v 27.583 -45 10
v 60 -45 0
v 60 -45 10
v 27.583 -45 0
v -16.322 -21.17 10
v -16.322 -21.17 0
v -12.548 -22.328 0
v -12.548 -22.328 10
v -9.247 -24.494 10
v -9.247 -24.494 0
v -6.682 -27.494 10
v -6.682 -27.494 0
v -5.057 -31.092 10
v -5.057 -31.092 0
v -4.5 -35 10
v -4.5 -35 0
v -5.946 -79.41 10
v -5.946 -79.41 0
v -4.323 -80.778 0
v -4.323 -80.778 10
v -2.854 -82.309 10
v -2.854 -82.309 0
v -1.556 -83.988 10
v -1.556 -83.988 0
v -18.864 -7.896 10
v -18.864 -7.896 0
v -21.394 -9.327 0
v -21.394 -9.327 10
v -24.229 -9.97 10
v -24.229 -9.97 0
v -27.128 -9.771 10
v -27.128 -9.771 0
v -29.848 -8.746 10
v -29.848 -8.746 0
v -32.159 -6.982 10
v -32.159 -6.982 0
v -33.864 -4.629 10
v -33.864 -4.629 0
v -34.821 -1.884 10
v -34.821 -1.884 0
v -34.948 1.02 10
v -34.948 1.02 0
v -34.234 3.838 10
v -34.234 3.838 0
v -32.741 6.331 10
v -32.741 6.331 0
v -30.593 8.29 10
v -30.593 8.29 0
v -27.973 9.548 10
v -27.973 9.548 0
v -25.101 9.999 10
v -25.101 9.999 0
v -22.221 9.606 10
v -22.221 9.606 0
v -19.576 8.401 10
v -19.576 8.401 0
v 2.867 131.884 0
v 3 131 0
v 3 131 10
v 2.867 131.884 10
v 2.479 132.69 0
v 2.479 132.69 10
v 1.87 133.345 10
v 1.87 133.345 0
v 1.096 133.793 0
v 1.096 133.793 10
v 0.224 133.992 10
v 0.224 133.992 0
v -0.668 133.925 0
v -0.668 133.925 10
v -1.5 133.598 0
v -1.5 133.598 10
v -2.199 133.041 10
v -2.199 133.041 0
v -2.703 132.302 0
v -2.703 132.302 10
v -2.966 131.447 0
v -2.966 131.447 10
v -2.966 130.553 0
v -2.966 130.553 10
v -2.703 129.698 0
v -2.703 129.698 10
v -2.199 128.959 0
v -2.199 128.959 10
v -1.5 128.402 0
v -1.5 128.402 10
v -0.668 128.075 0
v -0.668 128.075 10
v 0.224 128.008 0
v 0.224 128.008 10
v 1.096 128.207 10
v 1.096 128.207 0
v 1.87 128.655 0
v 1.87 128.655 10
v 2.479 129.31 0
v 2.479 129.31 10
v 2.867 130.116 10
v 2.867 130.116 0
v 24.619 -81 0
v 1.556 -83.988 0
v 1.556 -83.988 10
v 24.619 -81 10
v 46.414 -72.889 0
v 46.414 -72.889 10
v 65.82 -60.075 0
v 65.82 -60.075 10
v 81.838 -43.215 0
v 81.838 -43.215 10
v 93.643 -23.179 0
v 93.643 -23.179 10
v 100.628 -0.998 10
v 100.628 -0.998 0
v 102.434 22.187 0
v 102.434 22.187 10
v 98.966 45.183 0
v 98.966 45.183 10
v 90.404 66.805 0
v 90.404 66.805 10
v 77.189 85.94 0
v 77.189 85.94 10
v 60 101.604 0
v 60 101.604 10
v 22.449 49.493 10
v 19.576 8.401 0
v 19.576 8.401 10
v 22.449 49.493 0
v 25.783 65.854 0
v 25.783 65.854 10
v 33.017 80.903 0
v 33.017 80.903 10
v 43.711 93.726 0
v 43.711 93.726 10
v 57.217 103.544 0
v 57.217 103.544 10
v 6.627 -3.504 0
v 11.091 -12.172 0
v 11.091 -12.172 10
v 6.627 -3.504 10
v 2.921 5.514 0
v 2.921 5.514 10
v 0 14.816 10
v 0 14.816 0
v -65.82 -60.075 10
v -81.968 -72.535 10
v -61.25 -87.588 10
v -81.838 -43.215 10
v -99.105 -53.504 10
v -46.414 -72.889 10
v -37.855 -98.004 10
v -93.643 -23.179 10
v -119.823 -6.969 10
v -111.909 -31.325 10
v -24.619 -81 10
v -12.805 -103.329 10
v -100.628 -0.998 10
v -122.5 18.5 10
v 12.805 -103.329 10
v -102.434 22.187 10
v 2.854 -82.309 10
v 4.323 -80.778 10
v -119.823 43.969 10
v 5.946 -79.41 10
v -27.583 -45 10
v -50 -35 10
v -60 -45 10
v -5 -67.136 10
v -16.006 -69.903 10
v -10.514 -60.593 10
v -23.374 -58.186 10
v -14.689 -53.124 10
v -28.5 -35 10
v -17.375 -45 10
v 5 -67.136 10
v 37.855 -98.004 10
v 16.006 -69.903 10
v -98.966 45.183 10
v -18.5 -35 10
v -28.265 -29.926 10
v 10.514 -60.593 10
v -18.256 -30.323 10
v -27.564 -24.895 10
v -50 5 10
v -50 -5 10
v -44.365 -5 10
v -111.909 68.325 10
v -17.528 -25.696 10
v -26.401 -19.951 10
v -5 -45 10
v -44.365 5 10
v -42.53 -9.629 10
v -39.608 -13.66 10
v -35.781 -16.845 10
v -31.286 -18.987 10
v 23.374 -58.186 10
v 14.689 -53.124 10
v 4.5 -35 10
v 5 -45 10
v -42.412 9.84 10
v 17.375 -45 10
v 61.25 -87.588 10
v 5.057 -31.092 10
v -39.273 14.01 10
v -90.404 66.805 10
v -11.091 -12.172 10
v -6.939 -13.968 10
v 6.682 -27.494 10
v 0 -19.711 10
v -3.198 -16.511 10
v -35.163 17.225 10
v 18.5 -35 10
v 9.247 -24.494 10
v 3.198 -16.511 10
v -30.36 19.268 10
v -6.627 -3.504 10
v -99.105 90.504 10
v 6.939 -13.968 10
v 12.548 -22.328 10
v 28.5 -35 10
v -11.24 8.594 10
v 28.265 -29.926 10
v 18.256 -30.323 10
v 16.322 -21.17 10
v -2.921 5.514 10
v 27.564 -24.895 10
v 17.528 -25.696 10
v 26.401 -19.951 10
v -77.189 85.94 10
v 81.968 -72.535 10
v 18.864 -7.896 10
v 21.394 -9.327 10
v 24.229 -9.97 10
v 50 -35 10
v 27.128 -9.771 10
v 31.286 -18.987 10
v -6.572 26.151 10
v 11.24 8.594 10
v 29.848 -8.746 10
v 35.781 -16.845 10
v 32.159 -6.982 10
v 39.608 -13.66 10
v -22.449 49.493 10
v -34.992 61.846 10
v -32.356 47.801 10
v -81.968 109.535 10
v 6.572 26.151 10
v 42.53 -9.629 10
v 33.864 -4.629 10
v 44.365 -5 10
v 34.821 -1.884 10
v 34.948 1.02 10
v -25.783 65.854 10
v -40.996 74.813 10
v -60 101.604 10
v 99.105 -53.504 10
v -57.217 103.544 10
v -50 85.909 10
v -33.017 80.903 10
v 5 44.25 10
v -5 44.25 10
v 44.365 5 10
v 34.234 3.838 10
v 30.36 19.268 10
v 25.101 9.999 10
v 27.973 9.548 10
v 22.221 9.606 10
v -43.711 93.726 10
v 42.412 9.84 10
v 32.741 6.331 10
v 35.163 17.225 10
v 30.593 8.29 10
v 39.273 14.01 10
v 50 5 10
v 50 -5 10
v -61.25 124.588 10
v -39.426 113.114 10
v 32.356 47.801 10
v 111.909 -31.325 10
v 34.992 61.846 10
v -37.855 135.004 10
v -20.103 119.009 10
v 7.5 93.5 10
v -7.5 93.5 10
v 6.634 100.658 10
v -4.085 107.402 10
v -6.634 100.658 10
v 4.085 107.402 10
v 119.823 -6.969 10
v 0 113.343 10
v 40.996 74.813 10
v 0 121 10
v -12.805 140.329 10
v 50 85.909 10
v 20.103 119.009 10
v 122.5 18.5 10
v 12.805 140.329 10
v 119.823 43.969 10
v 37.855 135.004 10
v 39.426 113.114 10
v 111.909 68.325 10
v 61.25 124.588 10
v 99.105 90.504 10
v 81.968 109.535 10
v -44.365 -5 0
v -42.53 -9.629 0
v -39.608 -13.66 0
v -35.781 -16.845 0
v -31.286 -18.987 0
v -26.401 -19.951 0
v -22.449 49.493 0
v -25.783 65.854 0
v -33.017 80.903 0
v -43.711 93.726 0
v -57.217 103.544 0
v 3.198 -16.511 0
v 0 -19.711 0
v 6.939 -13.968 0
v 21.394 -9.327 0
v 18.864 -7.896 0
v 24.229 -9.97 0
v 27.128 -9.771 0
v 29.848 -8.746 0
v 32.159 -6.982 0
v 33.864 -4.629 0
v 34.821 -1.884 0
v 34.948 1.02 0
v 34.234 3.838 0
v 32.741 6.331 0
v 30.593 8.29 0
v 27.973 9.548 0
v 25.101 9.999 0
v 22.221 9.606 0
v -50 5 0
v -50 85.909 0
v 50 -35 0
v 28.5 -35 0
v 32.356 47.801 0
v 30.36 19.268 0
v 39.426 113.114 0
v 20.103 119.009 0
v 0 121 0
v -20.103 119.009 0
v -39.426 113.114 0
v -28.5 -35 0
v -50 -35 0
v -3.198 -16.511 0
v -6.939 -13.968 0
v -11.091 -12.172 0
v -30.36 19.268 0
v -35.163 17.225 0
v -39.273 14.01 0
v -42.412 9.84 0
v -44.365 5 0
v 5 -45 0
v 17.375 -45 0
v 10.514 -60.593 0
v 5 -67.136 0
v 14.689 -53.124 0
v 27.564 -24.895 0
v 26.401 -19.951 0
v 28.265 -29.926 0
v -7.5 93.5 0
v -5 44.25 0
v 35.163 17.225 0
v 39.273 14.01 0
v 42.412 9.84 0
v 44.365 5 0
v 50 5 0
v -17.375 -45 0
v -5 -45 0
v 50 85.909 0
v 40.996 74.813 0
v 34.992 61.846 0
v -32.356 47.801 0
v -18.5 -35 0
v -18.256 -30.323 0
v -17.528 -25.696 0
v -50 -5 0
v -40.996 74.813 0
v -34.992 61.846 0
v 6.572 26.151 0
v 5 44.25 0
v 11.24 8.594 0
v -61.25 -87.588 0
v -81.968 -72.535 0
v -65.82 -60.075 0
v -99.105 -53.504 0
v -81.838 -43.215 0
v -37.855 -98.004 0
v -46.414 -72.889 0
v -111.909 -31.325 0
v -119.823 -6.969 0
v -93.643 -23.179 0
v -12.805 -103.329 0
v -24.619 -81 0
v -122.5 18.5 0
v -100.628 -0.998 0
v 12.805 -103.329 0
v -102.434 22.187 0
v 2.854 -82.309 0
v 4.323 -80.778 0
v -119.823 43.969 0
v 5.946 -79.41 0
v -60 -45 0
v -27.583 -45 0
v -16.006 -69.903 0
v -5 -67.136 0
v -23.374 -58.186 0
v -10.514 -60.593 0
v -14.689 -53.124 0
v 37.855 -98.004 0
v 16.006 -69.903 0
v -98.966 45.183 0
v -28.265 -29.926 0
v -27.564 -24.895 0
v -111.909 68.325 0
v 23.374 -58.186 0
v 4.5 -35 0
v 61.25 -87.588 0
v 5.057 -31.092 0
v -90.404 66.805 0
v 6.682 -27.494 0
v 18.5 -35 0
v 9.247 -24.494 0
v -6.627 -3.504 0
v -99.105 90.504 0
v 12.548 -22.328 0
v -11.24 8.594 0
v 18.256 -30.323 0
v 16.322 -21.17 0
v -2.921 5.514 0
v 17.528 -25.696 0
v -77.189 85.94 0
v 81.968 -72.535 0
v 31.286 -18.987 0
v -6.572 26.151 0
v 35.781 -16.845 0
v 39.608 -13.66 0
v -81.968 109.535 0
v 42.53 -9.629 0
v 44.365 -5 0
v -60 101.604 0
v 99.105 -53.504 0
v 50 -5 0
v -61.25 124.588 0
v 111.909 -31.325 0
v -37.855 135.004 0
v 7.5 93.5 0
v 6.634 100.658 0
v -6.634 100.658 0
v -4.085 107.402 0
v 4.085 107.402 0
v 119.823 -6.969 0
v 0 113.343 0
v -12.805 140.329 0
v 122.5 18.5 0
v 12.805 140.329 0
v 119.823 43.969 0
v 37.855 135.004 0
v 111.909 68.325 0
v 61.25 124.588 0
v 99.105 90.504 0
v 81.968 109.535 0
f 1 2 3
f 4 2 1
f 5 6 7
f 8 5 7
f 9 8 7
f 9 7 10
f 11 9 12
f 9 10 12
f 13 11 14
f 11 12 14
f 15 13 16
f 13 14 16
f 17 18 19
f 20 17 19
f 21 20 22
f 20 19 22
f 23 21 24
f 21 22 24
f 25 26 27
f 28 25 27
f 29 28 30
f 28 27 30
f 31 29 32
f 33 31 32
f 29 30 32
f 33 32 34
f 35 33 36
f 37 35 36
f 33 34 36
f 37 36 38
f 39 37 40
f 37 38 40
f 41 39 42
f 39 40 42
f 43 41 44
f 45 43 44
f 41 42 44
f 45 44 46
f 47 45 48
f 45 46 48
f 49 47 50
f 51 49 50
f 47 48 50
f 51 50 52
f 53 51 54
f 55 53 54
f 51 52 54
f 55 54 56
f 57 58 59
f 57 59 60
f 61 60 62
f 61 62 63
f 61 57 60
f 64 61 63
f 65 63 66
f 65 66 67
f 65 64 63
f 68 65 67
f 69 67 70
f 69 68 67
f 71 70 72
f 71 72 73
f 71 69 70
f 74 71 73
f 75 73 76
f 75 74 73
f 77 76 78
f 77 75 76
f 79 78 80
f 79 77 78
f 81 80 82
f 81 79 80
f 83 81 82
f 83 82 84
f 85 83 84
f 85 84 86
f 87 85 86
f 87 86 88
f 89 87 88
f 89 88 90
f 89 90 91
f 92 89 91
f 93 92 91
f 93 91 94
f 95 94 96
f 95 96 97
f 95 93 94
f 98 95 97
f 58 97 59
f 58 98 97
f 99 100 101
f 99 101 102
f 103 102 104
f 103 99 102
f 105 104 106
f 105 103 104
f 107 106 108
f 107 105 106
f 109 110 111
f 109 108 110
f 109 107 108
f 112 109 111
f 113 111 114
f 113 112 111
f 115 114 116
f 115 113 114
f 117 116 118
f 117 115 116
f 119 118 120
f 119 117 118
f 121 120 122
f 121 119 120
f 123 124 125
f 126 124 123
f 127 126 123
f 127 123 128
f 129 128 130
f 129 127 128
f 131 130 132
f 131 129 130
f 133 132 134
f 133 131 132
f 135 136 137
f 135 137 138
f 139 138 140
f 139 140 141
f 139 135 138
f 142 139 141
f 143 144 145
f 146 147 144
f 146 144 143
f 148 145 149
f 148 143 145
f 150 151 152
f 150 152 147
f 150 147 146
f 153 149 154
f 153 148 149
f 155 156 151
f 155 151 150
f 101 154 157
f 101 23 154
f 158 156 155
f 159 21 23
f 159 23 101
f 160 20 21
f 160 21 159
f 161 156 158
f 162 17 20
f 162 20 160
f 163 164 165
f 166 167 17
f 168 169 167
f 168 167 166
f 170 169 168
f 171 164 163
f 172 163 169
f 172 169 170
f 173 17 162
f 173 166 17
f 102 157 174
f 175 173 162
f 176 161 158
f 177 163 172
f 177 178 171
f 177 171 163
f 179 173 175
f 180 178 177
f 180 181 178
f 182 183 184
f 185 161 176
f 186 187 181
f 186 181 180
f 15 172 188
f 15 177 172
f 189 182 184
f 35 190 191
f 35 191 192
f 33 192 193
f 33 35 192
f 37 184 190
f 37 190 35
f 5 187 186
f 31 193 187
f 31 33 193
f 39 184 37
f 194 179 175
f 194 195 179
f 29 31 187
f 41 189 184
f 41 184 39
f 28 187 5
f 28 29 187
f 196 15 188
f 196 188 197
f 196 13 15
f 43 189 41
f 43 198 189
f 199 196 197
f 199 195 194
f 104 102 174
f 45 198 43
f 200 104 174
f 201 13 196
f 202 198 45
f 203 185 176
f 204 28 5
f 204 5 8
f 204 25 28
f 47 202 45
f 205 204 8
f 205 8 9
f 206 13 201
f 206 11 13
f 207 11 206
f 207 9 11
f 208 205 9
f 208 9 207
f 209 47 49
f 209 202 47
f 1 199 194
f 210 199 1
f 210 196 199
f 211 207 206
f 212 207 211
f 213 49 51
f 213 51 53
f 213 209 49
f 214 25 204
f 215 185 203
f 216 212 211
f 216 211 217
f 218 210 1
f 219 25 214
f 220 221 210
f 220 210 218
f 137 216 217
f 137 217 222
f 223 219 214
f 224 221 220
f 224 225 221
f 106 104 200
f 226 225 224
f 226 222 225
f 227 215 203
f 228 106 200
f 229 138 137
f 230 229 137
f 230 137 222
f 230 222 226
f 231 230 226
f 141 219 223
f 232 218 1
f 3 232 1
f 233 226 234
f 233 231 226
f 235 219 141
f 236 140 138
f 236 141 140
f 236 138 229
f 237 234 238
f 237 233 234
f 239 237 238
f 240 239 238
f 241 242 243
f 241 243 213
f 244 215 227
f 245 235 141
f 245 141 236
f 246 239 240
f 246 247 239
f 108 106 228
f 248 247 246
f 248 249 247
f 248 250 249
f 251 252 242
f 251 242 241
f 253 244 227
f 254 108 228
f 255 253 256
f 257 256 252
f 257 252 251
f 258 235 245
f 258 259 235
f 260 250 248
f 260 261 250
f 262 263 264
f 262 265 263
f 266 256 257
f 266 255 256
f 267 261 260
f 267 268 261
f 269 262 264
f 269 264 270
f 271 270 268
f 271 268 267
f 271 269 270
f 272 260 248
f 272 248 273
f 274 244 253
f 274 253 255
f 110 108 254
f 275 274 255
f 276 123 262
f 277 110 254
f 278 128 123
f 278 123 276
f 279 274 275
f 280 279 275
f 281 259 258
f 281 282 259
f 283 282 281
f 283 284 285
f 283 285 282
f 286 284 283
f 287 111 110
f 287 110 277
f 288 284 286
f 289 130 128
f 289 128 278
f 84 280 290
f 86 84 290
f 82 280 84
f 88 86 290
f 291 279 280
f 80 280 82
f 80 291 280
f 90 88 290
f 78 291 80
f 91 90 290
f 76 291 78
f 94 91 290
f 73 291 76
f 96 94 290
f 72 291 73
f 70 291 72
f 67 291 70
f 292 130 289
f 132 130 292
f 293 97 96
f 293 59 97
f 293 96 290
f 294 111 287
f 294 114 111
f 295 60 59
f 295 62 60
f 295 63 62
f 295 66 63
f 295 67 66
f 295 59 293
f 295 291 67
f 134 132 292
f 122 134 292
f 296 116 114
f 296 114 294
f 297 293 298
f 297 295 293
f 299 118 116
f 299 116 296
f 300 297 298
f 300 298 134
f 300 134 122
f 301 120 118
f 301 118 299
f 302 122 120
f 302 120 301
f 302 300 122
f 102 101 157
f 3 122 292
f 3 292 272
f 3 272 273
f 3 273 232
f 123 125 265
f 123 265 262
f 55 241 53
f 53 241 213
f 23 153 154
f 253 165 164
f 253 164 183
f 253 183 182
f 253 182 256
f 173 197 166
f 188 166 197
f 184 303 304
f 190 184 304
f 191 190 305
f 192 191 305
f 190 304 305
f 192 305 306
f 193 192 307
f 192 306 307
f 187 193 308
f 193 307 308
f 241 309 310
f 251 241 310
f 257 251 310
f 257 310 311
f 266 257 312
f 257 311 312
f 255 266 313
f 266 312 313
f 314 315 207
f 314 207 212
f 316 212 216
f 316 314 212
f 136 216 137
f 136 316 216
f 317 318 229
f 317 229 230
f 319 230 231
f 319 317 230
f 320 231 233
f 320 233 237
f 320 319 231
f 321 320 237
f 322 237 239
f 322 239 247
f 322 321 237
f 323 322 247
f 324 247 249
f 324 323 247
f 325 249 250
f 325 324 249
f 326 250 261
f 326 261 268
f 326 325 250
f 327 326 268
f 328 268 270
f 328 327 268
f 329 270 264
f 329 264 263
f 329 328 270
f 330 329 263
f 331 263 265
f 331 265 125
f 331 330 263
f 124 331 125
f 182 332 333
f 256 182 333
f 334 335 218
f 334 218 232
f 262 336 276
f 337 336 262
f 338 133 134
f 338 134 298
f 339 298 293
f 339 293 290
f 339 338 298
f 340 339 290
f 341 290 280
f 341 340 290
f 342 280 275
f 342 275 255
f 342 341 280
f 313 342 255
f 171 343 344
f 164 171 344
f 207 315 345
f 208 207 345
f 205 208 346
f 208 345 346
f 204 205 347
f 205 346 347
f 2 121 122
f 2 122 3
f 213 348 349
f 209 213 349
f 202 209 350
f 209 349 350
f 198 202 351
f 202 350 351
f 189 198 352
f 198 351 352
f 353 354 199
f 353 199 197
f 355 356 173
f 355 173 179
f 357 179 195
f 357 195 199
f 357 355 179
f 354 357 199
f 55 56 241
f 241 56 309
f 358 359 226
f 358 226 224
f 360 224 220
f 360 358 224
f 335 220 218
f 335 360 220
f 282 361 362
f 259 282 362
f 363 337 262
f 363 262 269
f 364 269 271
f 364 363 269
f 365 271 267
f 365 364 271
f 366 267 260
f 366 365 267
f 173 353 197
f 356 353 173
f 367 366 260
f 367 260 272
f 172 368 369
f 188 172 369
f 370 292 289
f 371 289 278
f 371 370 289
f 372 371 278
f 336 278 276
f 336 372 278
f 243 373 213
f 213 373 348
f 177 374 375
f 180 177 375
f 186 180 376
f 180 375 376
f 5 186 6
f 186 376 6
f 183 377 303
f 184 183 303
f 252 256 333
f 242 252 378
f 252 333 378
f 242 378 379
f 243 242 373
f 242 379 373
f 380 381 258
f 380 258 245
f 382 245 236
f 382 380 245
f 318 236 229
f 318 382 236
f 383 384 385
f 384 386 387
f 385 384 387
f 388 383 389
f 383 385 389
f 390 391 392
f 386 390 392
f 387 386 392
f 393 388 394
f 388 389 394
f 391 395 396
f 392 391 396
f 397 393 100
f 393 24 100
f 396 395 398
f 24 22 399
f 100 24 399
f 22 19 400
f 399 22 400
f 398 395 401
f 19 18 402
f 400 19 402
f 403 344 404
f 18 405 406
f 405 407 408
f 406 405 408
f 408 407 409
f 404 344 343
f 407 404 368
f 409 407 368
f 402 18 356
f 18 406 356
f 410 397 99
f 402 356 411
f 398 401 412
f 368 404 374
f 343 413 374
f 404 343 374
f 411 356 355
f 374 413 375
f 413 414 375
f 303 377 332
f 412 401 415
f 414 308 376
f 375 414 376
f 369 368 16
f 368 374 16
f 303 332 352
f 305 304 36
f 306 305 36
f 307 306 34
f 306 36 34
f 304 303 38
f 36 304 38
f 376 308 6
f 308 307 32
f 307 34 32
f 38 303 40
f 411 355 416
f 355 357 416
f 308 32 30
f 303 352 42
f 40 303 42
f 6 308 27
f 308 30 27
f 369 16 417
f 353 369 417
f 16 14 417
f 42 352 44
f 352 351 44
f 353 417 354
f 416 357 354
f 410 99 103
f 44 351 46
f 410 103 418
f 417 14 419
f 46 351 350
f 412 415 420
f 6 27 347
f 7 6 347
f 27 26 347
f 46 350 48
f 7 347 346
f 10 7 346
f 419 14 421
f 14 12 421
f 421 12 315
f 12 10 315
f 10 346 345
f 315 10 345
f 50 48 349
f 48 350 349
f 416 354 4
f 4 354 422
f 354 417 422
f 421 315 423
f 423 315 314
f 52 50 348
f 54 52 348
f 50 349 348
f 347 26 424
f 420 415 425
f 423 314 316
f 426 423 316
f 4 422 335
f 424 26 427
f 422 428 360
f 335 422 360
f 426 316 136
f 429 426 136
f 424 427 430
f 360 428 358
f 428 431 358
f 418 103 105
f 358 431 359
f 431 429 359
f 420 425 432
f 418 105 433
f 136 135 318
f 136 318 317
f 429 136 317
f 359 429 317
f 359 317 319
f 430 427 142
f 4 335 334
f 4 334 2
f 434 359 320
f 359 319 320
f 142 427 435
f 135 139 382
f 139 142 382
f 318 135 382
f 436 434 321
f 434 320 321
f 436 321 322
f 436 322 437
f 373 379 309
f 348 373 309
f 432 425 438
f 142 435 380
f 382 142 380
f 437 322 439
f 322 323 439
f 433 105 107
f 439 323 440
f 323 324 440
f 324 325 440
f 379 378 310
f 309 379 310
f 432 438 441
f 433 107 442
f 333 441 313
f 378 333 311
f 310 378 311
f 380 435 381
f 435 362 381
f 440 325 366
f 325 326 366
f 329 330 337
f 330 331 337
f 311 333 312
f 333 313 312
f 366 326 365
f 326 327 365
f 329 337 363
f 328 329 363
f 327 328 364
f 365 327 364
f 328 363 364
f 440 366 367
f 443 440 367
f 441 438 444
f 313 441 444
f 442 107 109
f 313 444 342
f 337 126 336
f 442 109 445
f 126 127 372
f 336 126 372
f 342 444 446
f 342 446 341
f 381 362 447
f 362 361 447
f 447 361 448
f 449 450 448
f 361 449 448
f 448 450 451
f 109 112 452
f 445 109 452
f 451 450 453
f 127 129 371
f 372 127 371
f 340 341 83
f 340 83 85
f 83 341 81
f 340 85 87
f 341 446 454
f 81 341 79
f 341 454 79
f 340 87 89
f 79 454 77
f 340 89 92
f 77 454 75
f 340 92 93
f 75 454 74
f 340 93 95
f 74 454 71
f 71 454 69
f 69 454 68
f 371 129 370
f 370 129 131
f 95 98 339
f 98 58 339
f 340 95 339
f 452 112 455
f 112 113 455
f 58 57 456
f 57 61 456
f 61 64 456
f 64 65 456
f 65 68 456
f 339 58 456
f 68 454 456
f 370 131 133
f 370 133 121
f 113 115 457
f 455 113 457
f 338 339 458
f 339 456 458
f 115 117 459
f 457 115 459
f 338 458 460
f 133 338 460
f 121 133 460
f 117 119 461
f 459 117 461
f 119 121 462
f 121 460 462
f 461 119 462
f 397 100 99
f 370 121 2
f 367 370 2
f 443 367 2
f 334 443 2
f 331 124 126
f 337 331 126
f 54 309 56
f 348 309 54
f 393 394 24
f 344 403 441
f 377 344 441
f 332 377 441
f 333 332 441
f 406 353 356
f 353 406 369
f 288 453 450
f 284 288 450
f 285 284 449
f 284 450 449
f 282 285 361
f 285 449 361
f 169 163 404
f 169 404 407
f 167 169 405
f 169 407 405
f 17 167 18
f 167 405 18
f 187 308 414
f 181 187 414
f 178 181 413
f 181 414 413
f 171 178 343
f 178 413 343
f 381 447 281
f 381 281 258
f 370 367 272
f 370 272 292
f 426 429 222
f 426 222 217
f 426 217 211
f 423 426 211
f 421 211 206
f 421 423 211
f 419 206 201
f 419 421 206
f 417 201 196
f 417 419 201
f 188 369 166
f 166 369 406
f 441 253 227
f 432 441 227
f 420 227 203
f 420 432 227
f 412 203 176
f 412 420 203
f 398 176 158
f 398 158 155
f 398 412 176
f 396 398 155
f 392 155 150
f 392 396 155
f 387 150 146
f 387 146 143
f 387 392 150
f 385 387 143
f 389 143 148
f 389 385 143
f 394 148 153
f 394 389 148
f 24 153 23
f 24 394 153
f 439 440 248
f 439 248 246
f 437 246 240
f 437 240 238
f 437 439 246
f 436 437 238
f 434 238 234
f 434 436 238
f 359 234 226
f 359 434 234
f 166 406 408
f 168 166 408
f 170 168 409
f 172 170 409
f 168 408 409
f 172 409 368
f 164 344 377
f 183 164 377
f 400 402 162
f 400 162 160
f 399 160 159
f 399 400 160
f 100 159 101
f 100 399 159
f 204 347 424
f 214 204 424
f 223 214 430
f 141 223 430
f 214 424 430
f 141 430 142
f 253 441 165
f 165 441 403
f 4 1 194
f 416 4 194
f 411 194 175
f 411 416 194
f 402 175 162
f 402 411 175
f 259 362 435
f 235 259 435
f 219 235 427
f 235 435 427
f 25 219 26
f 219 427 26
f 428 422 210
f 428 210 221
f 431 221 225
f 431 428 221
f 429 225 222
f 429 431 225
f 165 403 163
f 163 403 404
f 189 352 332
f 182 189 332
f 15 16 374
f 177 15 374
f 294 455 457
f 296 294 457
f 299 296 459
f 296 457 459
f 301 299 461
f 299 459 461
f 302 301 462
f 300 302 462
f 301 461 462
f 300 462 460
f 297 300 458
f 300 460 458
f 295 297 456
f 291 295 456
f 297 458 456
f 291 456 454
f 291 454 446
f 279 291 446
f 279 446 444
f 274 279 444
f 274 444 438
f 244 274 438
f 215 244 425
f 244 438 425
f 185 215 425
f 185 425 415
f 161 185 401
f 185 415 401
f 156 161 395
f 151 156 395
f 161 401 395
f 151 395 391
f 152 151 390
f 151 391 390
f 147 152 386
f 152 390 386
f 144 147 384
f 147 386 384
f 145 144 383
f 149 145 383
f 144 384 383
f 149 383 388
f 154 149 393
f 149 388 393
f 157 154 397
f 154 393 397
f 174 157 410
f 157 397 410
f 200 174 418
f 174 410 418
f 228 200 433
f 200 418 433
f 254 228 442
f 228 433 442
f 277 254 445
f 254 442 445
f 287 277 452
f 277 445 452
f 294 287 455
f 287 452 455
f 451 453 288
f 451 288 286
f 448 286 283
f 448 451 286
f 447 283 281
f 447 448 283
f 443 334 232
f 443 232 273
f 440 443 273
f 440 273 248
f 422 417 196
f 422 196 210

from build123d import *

# Parameters (mm, degrees)
EXTRUDE_1_DEPTH = 10
SKETCH_3_R      = 122.5
SKETCH_3_R_2    = 102.5
SKETCH_3_R_3    = 3
EXTRUDE_2_DEPTH = 10


with BuildPart() as part:
    # Эскиз1 → Бобышка-Вытянуть1 (new body)
    with BuildSketch(Plane.XY):
        with BuildLine():
            Line((-60, -45), (-27.583269132, -45))
            ThreePointArc((-27.583269132, -45), (-20.06001769, -64.277376125), (-5.945767968, -79.41027067))
            ThreePointArc((-5.945767968, -79.41027067), (-2.542345747, -82.680315027), (0, -86.656865167))
            Line((0, -86.656865167), (0, -19.711115149))
            ThreePointArc((0, -19.711115149), (-5.008387109, -15.151161707), (-11.091351129, -12.172124017))
            ThreePointArc((-11.091351129, -12.172124017), (-4.677676581, 0.965070873), (0, 14.815718966))
            Line((0, 14.815718966), (0, 113.343134833))
            ThreePointArc((0, 113.343134833), (-5.562430401, 104.106601718), (-7.5, 93.5))
            Line((-7.5, 93.5), (-5, 44.25))
            ThreePointArc((-5, 44.25), (-8.525159088, 17.271181236), (-18.863936417, -7.896120801))
            ThreePointArc((-18.863936417, -7.896120801), (-34.990467135, -0.436539144), (-19.576058944, 8.401241779))
            Line((-19.576058944, 8.401241779), (-22.449472465, 49.49296956))
            ThreePointArc((-22.449472465, 49.49296956), (-33.881518529, 82.214174393), (-60, 105))
            Line((-60, 105), (-60, -45))
        make_face()
        with BuildLine():
            ThreePointArc((-26.401072965, -19.950864506), (-27.972740949, -27.40259956), (-28.5, -35))
            Line((-28.5, -35), (-50, -35))
            Line((-50, -35), (-50, -5))
            Line((-50, -5), (-44.364916731, -5))
            ThreePointArc((-44.364916731, -5), (-37.794087282, -15.372421104), (-26.401072965, -19.950864506))
        make_face(mode=Mode.SUBTRACT)
        with BuildLine():
            Line((-5, -45), (-5, -67.136427928))
            ThreePointArc((-5, -67.136427928), (-12.779082294, -56.957998409), (-17.374821937, -45))
            Line((-17.374821937, -45), (-5, -45))
        make_face(mode=Mode.SUBTRACT)
        with BuildLine():
            Line((-4.5, -35), (-18.5, -35))
            ThreePointArc((-18.5, -35), (-17.952221542, -28), (-16.322222222, -21.170419965))
            ThreePointArc((-16.322222222, -21.170419965), (-7.858362699, -25.902991945), (-4.5, -35))
        make_face(mode=Mode.SUBTRACT)
        with BuildLine():
            Line((-44.364916731, 5), (-50, 5))
            Line((-50, 5), (-50, 85.909197079))
            ThreePointArc((-50, 85.909197079), (-37.591425702, 68.515820434), (-32.355603325, 47.801370616))
            Line((-32.355603325, 47.801370616), (-30.360374841, 19.268273964))
            ThreePointArc((-30.360374841, 19.268273964), (-39.273434111, 14.009606657), (-44.364916731, 5))
        make_face(mode=Mode.SUBTRACT)
    extrude_1 = extrude(amount=EXTRUDE_1_DEPTH)

    # Зеркальное отражение1: Бобышка-Вытянуть1 across plane
    add(extrude_1.mirror(Plane(origin=(0, 0, 0), x_dir=(0, 0, 1), z_dir=(1, 0, 0))))

    # Эскиз3 → Бобышка-Вытянуть2 (add)
    with BuildSketch(Plane.XY):
        with Locations((0, 18.5)):
            Circle(SKETCH_3_R)
        with Locations((0, 18.5)):
            Circle(SKETCH_3_R_2, mode=Mode.SUBTRACT)
        with Locations((0, 131)):
            Circle(SKETCH_3_R_3, mode=Mode.SUBTRACT)
    extrude(amount=EXTRUDE_2_DEPTH)


solid = part.part
